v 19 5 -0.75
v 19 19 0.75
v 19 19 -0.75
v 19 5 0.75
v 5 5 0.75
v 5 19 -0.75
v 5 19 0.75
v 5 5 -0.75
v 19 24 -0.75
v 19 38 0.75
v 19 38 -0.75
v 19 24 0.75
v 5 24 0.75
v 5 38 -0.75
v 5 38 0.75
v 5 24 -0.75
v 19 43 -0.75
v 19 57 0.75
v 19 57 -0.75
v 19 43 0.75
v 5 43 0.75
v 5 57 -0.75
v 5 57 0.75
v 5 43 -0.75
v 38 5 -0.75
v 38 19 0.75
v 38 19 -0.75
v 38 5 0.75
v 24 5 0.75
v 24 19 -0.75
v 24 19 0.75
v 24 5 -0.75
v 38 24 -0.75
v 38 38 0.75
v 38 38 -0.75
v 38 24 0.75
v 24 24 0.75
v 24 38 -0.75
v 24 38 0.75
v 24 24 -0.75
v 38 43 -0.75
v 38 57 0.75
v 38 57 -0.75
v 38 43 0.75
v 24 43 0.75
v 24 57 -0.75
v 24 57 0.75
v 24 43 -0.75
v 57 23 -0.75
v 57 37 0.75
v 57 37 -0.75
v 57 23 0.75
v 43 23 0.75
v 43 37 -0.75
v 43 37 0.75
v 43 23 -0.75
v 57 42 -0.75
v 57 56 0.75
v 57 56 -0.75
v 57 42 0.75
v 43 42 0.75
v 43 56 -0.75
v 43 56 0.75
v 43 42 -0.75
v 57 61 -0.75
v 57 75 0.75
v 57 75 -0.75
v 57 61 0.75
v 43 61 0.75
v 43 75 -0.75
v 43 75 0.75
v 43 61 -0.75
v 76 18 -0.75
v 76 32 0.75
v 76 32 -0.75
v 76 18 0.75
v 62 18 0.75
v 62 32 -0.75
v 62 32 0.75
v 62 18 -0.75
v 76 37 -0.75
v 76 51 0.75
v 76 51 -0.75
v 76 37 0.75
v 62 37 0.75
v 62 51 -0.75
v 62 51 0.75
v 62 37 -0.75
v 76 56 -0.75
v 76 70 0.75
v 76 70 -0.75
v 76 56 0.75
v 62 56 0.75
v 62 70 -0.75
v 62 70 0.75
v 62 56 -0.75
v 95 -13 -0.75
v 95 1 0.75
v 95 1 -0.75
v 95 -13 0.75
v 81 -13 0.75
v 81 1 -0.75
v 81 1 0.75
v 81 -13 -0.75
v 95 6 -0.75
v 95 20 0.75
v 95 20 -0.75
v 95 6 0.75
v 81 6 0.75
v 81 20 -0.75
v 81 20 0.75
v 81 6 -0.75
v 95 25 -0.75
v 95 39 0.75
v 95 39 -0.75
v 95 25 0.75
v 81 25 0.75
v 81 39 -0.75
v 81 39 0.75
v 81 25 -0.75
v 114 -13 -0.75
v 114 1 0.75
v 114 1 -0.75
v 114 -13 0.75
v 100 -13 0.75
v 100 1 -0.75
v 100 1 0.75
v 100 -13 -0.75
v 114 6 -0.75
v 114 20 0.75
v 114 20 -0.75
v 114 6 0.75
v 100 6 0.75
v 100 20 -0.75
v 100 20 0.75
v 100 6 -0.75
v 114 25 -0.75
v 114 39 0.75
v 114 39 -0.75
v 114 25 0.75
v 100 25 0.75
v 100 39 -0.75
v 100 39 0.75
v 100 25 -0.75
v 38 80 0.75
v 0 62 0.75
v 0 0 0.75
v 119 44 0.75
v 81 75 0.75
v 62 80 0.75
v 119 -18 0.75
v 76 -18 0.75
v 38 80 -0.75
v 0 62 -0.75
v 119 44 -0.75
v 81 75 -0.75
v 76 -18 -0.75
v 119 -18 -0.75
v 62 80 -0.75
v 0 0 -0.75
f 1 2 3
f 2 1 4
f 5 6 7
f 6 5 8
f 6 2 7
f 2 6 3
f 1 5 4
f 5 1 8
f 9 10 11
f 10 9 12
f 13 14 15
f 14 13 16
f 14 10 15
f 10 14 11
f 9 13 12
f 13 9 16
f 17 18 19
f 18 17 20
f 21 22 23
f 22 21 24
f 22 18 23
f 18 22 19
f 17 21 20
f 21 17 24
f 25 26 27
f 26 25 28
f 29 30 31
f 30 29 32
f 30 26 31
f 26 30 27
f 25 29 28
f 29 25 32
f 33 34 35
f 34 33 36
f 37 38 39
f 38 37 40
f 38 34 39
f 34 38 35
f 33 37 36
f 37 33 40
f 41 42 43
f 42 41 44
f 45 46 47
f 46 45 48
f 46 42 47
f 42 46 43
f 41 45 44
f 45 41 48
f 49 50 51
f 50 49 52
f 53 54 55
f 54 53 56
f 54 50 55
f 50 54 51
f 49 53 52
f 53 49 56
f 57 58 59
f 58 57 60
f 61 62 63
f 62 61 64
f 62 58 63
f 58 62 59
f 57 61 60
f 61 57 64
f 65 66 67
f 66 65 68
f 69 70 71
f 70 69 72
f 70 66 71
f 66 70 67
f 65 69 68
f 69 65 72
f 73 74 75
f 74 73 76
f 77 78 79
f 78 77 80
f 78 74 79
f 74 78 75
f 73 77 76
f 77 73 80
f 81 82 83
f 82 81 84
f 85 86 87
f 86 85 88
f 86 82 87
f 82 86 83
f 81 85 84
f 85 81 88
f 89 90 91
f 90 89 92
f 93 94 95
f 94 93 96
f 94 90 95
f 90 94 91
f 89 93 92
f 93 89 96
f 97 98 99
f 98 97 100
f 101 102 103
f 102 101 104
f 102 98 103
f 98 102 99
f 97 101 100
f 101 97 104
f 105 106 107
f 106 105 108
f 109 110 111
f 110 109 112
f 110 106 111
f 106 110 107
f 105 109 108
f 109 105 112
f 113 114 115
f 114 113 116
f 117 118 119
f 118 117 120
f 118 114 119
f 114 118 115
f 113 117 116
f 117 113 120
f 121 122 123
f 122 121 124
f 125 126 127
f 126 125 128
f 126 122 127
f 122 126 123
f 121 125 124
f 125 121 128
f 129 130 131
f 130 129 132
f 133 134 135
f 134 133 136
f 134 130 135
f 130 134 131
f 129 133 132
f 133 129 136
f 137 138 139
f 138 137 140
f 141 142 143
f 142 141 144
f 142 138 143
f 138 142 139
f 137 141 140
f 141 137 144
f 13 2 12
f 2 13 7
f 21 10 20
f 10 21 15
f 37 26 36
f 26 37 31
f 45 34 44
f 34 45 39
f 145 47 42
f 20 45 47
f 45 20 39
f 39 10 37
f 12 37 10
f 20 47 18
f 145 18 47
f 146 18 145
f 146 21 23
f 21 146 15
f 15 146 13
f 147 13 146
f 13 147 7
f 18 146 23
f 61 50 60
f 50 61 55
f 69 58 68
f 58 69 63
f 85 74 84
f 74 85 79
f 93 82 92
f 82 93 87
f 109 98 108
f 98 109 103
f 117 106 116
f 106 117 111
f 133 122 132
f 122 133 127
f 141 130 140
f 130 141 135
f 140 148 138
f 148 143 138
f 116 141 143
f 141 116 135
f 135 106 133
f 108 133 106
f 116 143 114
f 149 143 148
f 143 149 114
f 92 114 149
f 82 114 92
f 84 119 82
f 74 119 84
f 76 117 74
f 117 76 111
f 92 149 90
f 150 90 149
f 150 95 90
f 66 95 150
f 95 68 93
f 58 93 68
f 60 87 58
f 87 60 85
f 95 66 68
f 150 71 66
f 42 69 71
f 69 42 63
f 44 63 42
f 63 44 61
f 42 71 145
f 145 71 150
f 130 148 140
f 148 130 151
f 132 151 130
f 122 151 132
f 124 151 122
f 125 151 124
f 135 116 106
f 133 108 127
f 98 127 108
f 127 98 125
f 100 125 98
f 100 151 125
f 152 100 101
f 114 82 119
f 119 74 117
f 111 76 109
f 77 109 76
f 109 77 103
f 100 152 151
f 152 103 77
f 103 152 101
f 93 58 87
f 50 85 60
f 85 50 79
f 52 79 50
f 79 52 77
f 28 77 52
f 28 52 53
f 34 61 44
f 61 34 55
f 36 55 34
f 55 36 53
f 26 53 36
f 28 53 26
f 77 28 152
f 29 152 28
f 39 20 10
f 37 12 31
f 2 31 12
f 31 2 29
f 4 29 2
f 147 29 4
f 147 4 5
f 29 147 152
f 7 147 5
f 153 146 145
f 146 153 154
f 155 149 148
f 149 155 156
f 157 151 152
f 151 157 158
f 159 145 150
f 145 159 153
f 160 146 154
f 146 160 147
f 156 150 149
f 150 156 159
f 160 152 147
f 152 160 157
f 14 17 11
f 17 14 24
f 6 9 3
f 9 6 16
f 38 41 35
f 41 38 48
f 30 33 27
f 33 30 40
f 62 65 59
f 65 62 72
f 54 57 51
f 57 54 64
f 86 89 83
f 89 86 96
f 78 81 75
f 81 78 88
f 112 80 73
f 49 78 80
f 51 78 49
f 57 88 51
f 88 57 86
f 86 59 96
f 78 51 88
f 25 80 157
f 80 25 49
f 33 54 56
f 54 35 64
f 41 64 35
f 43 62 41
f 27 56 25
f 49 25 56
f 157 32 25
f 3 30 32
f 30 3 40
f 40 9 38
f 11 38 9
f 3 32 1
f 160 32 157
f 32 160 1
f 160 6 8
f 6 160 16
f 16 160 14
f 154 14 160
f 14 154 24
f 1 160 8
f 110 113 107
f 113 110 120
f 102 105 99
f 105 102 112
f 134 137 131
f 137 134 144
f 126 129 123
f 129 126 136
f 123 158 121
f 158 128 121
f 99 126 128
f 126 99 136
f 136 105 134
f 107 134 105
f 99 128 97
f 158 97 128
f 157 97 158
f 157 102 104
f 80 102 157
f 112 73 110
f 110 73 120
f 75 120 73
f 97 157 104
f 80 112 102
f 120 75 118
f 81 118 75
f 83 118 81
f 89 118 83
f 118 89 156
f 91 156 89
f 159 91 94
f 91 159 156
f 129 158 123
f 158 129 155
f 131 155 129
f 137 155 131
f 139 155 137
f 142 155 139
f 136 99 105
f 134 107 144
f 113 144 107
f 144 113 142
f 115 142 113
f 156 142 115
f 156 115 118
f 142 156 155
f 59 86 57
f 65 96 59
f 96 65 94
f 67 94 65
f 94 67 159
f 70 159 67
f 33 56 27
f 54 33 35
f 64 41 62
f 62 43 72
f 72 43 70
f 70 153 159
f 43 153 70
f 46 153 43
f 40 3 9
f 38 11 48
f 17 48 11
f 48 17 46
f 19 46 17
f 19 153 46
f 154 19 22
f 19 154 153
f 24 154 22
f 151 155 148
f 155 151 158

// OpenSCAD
/*

    This program is free software: you can redistribute it and/or modify it under the terms of the Affero GNU General Public License as published by the Free Software Foundation, either version 3 of the License, or (at your option) any later version.

    This program is distributed in the hope that it will be useful, but WITHOUT ANY WARRANTY; without even the implied warranty of MERCHANTABILITY or FITNESS FOR A PARTICULAR PURPOSE.  See the Affero GNU General Public License for more details.

    You should have received a copy of the GNU General Public License along with this program.  If not, see <https://www.gnu.org/licenses/agpl-3.0.txt>
*/


/**********************
globals
**********************/
e = 0.1;
DEBUG=0;

max_r = 0.3;
hole_size = [14,14,1.5];
space = 5;

// how to stager columns based on fingers, starting with index
finger_stagger=[0,0,18,13,-18,-18];

/**********************
renders
**********************/

translate([0,0,0]) top_plate();

/**********************
modules
**********************/
module top_plate() {
  count = [6,3];
  translate([5,5,0])
  difference () {
    scale([1,1,0.5])
    hull() {
      translate([-5,-5,0]) hole_array(count, finger_stagger);
      translate([5,-5,0]) hole_array(count, finger_stagger);
      translate([5,5,0]) hole_array(count, finger_stagger);
      translate([-5,5,0]) hole_array(count, finger_stagger); 
    }
    hole_array([6,3], finger_stagger);
  }
}

module hole() {
  translate([0,0,-hole_size.z])
  scale([1,1,2])  
  cube(hole_size);
}

module hole_array(count,stagger) {
  stgr = stagger ? stagger : ([for (i=[1:count.x]) [0]]);
  
  if (DEBUG) echo(stgr=stgr,stgr0=stgr[1]);
    
  for (i=[0:count.x-1]) {
    for (j=[0:count.y-1]) {
      if (DEBUG) {
        echo(ij=[i,j],x=i*(space+hole_size.x),y=j*(space+hole_size.y)+stgr[i]);
      }
      translate([i*(space+hole_size.x), j*(space+hole_size.y)+stgr[i],0])
      hole();
    } // loop j - rows
  } // loop i - columns
}
